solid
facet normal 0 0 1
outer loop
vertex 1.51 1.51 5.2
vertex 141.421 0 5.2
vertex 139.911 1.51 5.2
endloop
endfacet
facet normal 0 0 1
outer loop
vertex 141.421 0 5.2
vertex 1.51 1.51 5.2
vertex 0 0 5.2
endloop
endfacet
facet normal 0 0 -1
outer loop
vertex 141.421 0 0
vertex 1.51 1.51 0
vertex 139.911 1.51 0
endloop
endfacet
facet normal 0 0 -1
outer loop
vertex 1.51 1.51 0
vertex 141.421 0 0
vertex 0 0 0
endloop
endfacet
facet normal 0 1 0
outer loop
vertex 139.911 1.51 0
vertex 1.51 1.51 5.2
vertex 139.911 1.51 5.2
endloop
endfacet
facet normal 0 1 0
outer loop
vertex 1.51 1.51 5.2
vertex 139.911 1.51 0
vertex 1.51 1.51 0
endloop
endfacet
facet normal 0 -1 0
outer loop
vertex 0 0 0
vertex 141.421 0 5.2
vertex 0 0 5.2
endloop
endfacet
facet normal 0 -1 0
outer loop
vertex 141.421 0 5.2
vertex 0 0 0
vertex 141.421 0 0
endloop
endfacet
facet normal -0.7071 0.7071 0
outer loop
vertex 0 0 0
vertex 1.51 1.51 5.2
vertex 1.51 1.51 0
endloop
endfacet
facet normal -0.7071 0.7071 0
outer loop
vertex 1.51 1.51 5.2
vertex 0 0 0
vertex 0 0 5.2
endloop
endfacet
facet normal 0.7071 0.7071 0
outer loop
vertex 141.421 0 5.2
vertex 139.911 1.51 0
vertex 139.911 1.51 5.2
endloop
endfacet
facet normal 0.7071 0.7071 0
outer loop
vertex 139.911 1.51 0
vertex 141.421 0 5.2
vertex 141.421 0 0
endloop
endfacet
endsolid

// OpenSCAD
thickness = 1.51*1.2;

module diagonal_stucco(x) {
    extra = sqrt((12.5/2)*(12.5/2)*2);
    color("Cornsilk") intersection() {
        translate([0,1.5,0]) cube([sqrt(((x*25)+12.5)*((x*25)+12.5)*2),9.5,44]);
        translate([0,,0]) rotate([0,0,-45]) translate([0,0,0]) cube([x*25,x*25,44]);
    }
}
//diagonal_stucco(2);


module section_negative(x,beam=false,right=false,left=false) {
    beamval = beam ? 1.5 : 0;
    rightval = right ? 1.5 : 0;
    leftval = left ? 1.5 : 0;
    translate([sqrt(100*100*2)/4*(x-1)+beamval+leftval,0,0]) cube([sqrt(100*100*2)/4-beamval*2-leftval-rightval,12.5,38.8]);
}

module base_beam(x,back=false) {
    color("SaddleBrown") intersection() {
        translate([0,back?12.5-thickness:0,5.2]) cube([200, thickness, 3]);
        translate([0,0,0]) rotate([0,0,-45]) translate([0,0,0]) cube([x*25,x*25,38.8]);
    }
}

//Vertical Beams
x=4;
//translate([sqrt(100*100*2)/4*(x-1)-1.5,0,3+5.2]) cube([3,thickness,38.8-6]);
//translate([sqrt(100*100*2)/4*(3-1)-1.5,0,3+5.2]) cube([3,thickness,38.8-6]);
//translate([sqrt(100*100*2)/4*(4-1)-1.5,0,3+5.2]) cube([3,thickness,38.8-6]);
//translate([sqrt(100*100*2)/4*(x-1)-1.5,12.5-thickness,0]) cube([3,thickness,44-3]);
//translate([sqrt(100*100*2)/4*(3-1)-1.5,12.5-thickness,0]) cube([3,thickness,44-3]);
//translate([sqrt(100*100*2)/4*(4-1)-1.5,12.5-thickness,0]) cube([3,thickness,44-3]);


//Cross Beams
/*intersection() {
    //translate([-5.1-3,0,38.8/3+1]) cube([sqrt((100)*(100)*2),thickness,3]);
    translate([3,12.5-thickness,38.8/3+1+5.2]) cube([sqrt((100)*(100)*2),thickness,3]);
    section_negative(4,beam=true);
}*/
//translate([5.1+3,0,38.8/3+1]) cube([sqrt((25)*(25)*2)-(5.1+3)*2,thickness,3]);



//Ends
/*intersection() {
    x=2;
    translate([sqrt((x*25)*(x*25)*2)-3,0,3+5.2]) cube([3,thickness,38.8-6]);
    translate([0,0,0]) rotate([0,0,-45]) translate([0,0,0]) cube([x*25,x*25,44]);
}*/
/*intersection() {
    translate([0,0,3+5.2]) cube([3,thickness,38.8-6]);
    translate([0,0,0]) rotate([0,0,-45]) translate([0,0,0]) cube([25,25,44]);
}*/
/*intersection() {
    x=4;
    translate([sqrt((x*25)*(x*25)*2)-12.5-1.5,12.5-thickness,0]) cube([3,thickness,44-3]);
    translate([0,0,0]) rotate([0,0,-45]) translate([0,0,0]) cube([x*25,x*25,44]);
}*/
/*intersection() {
    translate([12.5-1.5,12.5-thickness,]) cube([3,thickness,44-3]);
    translate([0,0,0]) rotate([0,0,-45]) translate([0,0,0]) cube([25,25,44]);
}*/


//Base
/*translate([0,0,44-5.2-3]) intersection() {
    base_beam(4,true);
    section_negative(3);
}*/

/*
//Top
intersection() {
    base_beam(2);
    section_negative(1);
}
*/

//diagonal_stucco(1);
//diagonal_stucco(2);
//diagonal_stucco(3);
//diagonal_stucco(4);


color("Cornsilk") intersection() {
    translate([0,0,0]) cube([sqrt(((x*25)+12.5)*((x*25)+12.5)*2),1.51,5.2]);
    translate([0,,0]) rotate([0,0,-45]) translate([0,0,0]) cube([x*25,x*25,44]);
}
